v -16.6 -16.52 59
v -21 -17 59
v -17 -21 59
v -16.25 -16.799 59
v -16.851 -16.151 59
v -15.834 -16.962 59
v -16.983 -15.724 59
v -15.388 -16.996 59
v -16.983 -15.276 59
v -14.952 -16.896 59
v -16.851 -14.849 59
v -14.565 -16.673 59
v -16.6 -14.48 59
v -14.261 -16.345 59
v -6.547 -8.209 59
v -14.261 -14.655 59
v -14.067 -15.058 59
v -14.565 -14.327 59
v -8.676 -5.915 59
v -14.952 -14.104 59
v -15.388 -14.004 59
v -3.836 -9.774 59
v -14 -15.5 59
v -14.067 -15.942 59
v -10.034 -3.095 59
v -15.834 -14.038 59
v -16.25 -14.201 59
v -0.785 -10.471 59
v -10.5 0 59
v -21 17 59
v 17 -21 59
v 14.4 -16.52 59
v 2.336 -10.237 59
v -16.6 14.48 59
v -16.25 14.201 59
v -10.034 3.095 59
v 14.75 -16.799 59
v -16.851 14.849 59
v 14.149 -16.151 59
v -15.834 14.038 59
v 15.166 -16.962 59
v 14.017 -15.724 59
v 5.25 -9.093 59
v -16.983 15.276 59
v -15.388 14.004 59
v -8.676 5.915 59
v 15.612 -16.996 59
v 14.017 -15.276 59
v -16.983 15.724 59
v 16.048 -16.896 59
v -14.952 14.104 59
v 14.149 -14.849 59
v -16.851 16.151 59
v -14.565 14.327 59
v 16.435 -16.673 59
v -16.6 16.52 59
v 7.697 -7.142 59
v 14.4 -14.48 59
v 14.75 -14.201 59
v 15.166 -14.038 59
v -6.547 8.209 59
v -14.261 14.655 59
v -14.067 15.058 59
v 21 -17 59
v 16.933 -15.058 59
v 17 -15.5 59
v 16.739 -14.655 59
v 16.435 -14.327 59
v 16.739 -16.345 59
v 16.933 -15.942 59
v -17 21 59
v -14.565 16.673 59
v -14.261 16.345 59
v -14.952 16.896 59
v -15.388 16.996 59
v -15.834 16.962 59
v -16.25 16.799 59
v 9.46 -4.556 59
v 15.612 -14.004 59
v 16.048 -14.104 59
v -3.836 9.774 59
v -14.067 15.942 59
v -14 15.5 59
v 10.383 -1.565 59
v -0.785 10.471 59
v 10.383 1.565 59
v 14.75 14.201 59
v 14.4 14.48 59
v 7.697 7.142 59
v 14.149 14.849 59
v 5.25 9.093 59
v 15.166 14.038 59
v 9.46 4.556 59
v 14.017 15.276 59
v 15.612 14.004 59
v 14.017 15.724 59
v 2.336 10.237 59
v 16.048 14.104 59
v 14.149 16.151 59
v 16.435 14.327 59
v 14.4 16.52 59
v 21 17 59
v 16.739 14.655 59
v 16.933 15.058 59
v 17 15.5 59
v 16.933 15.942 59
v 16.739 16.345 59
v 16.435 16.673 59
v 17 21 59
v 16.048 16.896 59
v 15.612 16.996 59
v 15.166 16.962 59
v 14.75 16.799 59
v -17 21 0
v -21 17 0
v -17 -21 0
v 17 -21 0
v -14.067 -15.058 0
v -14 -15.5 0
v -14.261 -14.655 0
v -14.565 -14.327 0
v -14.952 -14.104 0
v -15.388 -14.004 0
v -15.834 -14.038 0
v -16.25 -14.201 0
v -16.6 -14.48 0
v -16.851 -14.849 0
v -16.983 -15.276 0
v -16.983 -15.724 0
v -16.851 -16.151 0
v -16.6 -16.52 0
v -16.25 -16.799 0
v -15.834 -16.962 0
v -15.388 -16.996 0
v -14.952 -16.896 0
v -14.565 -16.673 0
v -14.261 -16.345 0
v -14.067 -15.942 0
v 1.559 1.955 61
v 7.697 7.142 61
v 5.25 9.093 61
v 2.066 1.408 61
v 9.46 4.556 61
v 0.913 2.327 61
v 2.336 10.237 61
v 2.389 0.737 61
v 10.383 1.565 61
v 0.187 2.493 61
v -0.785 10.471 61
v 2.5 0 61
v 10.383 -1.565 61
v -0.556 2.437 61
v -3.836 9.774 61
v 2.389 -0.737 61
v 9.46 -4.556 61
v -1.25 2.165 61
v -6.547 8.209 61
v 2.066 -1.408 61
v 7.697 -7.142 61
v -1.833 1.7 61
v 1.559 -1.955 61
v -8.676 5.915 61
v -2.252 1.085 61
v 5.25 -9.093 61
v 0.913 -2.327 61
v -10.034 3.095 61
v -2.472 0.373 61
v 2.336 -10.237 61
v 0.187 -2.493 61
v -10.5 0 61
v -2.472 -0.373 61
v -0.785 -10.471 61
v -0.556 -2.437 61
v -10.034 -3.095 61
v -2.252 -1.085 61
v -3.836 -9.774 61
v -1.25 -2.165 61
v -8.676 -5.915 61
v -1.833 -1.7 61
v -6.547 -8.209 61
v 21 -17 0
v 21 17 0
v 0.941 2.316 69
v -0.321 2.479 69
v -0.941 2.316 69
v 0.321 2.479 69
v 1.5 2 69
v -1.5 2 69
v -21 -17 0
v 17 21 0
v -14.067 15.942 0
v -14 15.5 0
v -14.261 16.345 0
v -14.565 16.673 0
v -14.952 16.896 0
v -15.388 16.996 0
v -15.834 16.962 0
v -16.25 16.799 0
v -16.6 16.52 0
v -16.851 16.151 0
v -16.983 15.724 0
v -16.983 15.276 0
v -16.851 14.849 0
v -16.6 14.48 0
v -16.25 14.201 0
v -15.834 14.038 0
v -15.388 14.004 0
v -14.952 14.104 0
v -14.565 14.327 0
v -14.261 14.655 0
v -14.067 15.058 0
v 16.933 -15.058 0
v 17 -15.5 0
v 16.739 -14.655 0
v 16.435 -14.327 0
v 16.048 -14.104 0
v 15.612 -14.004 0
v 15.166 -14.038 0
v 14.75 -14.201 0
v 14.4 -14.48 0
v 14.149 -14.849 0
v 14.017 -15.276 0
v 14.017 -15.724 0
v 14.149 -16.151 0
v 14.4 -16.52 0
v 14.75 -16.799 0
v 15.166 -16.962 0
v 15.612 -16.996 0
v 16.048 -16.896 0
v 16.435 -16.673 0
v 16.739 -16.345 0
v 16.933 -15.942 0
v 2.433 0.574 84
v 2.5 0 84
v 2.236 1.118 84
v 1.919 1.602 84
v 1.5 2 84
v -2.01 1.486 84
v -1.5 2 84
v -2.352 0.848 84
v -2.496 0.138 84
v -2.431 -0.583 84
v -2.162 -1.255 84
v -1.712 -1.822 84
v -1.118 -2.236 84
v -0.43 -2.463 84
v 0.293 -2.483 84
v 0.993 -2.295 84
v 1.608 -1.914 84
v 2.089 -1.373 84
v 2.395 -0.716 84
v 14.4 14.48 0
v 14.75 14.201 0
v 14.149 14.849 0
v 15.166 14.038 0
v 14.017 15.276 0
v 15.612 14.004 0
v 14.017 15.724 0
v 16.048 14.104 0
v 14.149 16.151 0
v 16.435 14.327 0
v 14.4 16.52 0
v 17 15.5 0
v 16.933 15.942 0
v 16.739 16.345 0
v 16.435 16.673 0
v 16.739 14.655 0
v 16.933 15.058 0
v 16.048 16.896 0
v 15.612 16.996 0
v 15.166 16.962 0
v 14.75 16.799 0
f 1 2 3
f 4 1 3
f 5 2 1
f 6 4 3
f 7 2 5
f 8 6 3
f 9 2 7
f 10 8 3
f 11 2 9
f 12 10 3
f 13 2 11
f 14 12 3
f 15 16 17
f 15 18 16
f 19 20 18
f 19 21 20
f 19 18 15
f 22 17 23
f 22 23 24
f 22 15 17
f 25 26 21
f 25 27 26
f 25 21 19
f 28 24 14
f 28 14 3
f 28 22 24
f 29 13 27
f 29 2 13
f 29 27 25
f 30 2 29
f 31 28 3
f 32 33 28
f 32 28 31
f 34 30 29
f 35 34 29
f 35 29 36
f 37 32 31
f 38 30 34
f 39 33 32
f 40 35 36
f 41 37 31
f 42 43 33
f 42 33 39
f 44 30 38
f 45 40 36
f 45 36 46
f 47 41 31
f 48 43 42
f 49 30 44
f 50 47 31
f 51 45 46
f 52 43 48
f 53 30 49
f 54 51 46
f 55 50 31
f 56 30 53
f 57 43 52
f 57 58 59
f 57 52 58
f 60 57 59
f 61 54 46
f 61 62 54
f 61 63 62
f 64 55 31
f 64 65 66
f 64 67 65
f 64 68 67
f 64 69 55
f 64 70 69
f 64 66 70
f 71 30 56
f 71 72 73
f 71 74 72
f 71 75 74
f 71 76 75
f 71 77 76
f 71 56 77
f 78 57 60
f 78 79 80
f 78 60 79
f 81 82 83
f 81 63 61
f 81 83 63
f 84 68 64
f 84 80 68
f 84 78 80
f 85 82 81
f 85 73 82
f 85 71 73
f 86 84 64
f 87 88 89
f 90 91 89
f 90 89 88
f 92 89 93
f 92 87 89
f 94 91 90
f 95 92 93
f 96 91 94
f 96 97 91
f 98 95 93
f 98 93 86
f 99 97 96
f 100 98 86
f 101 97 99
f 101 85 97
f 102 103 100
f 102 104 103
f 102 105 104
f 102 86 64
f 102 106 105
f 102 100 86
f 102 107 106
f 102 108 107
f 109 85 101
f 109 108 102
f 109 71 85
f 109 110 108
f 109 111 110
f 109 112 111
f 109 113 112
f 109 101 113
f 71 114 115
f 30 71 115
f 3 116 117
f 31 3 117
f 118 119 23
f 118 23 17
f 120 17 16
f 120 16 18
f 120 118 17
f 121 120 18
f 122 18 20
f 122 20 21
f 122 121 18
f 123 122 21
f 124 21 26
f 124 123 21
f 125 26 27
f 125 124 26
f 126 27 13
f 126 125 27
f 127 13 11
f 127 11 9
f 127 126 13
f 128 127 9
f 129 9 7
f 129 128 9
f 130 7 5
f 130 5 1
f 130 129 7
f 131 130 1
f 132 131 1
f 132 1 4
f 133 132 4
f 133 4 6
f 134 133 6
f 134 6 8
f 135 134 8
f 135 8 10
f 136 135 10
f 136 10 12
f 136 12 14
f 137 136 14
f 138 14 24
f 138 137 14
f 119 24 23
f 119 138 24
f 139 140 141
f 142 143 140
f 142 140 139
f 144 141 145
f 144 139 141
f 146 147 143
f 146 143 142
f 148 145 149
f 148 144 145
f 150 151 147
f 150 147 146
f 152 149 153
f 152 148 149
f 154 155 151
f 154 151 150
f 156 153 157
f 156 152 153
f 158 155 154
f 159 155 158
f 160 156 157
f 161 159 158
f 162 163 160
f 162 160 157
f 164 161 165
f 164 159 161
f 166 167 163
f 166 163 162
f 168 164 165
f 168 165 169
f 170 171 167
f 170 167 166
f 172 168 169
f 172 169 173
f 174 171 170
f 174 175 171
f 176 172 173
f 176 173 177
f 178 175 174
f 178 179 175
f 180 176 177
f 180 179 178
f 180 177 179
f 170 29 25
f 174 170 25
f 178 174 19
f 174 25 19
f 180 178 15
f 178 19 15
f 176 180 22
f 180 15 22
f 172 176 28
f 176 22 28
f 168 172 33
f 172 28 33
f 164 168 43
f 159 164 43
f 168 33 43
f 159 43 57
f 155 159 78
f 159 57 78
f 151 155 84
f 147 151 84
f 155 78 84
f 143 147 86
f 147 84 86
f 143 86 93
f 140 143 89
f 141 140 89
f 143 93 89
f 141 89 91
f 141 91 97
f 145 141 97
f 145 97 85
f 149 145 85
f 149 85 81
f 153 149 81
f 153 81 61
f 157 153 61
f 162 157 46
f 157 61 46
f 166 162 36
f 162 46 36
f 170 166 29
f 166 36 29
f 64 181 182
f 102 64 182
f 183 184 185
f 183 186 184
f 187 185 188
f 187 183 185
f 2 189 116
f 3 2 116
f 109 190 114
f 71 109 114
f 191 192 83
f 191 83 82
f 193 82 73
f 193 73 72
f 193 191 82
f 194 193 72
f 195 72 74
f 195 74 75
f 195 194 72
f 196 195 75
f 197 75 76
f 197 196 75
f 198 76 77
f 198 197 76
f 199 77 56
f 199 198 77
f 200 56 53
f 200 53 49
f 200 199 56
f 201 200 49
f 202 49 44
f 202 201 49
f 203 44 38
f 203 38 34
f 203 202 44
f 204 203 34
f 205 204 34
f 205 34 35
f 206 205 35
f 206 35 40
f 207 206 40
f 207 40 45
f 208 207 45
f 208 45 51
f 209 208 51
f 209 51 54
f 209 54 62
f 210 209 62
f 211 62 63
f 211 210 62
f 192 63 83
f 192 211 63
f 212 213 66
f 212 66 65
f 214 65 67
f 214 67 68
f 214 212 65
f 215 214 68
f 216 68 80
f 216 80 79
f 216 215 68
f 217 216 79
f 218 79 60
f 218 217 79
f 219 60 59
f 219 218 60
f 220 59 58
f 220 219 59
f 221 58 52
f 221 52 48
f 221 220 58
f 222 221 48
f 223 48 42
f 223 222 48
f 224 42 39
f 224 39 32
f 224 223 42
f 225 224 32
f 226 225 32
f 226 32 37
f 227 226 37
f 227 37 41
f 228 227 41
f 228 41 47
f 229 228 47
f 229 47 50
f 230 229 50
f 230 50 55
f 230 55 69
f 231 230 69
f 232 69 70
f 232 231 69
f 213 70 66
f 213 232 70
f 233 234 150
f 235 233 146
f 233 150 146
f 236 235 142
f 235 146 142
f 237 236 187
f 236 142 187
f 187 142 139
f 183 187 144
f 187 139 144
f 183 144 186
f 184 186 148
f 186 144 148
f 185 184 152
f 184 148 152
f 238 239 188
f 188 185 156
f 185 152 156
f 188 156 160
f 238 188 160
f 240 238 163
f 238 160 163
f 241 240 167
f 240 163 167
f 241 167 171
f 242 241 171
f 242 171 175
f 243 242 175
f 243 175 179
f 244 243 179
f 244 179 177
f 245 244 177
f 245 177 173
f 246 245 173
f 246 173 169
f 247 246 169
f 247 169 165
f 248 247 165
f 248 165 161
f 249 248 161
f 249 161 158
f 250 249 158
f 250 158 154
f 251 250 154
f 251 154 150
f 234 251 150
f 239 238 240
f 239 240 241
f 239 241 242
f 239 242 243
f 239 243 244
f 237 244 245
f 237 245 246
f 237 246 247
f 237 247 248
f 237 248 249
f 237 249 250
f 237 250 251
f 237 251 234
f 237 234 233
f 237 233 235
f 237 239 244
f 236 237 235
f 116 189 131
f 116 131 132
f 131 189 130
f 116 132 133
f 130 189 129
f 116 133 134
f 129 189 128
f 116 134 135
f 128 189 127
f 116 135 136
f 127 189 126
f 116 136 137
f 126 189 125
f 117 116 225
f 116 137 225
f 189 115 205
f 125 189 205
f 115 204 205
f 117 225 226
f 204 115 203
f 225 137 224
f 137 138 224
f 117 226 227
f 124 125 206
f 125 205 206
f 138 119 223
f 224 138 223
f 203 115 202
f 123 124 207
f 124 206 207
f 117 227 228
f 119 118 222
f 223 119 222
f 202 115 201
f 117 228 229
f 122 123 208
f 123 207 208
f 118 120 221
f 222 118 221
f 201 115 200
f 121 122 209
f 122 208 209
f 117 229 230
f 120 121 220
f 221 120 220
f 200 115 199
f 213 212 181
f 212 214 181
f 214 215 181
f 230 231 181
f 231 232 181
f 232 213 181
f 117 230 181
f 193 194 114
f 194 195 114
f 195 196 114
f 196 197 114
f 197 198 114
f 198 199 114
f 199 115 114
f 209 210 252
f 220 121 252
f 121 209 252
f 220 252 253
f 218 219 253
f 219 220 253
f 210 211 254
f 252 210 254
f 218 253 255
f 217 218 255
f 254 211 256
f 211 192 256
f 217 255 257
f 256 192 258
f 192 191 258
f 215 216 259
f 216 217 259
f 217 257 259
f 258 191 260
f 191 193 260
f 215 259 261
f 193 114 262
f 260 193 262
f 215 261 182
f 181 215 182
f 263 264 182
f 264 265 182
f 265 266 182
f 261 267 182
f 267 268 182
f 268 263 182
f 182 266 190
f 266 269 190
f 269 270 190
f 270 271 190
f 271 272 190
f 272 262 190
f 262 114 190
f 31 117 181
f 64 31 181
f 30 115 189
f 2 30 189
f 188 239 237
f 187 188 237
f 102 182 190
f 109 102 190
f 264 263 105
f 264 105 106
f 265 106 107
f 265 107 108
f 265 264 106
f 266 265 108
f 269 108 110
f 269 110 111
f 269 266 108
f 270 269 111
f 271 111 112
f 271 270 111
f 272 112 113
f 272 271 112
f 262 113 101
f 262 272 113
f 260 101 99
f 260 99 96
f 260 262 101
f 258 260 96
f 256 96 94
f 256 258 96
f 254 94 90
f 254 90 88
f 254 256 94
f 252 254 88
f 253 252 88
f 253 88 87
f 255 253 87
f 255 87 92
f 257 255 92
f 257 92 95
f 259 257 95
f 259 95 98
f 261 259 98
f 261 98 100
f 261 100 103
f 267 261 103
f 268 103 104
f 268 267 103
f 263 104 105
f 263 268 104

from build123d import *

# Parameters (mm, degrees)
SKIZZE1_R                       = 1.5
AUFSATZ_LINEAR_AUSTRAGEN1_DEPTH = 59
SKIZZE2_R                       = 10.5
AUFSATZ_LINEAR_AUSTRAGEN2_DEPTH = 2
SKIZZE3_R                       = 2.5
AUFSATZ_LINEAR_AUSTRAGEN3_DEPTH = 23
SCHNITT_LINEAR_AUSTRAGEN1_DEPTH = 15


with BuildPart() as part:
    # Skizze1 → Aufsatz-Linear austragen1 (new body)
    with BuildSketch(Plane.XY):
        Polygon((-17, -21), (17, -21), (21, -17), (21, 17), (17, 21), (-17, 21), (-21, 17), (-21, -17), align=None)
        with Locations((15.5, 15.5)):
            Circle(SKIZZE1_R, mode=Mode.SUBTRACT)
        with Locations((15.5, -15.5)):
            Circle(SKIZZE1_R, mode=Mode.SUBTRACT)
        with Locations((-15.5, -15.5)):
            Circle(SKIZZE1_R, mode=Mode.SUBTRACT)
        with Locations((-15.5, 15.5)):
            Circle(SKIZZE1_R, mode=Mode.SUBTRACT)
    extrude(amount=AUFSATZ_LINEAR_AUSTRAGEN1_DEPTH)

    # Skizze2 → Aufsatz-Linear austragen2 (add)
    with BuildSketch(Plane.XY.offset(59)):
        with Locations(Location((0, 0, 0), (0, 0, 180))):
            Circle(SKIZZE2_R)
    extrude(amount=AUFSATZ_LINEAR_AUSTRAGEN2_DEPTH)

    # Skizze3 → Aufsatz-Linear austragen3 (add)
    with BuildSketch(Plane.XY.offset(61)):
        Circle(SKIZZE3_R)
    extrude(amount=AUFSATZ_LINEAR_AUSTRAGEN3_DEPTH)

    # Skizze4 → Schnitt-Linear austragen1 (cut)
    with BuildSketch(Plane.XY.offset(84)):
        Polygon((-75.850602173, 2), (-1.5, 2), (1.5, 2), (75.850602173, 2), (75.850602173, 150.701204346), (-75.850602173, 150.701204346), align=None)
    extrude(amount=-SCHNITT_LINEAR_AUSTRAGEN1_DEPTH, mode=Mode.SUBTRACT)


solid = part.part
